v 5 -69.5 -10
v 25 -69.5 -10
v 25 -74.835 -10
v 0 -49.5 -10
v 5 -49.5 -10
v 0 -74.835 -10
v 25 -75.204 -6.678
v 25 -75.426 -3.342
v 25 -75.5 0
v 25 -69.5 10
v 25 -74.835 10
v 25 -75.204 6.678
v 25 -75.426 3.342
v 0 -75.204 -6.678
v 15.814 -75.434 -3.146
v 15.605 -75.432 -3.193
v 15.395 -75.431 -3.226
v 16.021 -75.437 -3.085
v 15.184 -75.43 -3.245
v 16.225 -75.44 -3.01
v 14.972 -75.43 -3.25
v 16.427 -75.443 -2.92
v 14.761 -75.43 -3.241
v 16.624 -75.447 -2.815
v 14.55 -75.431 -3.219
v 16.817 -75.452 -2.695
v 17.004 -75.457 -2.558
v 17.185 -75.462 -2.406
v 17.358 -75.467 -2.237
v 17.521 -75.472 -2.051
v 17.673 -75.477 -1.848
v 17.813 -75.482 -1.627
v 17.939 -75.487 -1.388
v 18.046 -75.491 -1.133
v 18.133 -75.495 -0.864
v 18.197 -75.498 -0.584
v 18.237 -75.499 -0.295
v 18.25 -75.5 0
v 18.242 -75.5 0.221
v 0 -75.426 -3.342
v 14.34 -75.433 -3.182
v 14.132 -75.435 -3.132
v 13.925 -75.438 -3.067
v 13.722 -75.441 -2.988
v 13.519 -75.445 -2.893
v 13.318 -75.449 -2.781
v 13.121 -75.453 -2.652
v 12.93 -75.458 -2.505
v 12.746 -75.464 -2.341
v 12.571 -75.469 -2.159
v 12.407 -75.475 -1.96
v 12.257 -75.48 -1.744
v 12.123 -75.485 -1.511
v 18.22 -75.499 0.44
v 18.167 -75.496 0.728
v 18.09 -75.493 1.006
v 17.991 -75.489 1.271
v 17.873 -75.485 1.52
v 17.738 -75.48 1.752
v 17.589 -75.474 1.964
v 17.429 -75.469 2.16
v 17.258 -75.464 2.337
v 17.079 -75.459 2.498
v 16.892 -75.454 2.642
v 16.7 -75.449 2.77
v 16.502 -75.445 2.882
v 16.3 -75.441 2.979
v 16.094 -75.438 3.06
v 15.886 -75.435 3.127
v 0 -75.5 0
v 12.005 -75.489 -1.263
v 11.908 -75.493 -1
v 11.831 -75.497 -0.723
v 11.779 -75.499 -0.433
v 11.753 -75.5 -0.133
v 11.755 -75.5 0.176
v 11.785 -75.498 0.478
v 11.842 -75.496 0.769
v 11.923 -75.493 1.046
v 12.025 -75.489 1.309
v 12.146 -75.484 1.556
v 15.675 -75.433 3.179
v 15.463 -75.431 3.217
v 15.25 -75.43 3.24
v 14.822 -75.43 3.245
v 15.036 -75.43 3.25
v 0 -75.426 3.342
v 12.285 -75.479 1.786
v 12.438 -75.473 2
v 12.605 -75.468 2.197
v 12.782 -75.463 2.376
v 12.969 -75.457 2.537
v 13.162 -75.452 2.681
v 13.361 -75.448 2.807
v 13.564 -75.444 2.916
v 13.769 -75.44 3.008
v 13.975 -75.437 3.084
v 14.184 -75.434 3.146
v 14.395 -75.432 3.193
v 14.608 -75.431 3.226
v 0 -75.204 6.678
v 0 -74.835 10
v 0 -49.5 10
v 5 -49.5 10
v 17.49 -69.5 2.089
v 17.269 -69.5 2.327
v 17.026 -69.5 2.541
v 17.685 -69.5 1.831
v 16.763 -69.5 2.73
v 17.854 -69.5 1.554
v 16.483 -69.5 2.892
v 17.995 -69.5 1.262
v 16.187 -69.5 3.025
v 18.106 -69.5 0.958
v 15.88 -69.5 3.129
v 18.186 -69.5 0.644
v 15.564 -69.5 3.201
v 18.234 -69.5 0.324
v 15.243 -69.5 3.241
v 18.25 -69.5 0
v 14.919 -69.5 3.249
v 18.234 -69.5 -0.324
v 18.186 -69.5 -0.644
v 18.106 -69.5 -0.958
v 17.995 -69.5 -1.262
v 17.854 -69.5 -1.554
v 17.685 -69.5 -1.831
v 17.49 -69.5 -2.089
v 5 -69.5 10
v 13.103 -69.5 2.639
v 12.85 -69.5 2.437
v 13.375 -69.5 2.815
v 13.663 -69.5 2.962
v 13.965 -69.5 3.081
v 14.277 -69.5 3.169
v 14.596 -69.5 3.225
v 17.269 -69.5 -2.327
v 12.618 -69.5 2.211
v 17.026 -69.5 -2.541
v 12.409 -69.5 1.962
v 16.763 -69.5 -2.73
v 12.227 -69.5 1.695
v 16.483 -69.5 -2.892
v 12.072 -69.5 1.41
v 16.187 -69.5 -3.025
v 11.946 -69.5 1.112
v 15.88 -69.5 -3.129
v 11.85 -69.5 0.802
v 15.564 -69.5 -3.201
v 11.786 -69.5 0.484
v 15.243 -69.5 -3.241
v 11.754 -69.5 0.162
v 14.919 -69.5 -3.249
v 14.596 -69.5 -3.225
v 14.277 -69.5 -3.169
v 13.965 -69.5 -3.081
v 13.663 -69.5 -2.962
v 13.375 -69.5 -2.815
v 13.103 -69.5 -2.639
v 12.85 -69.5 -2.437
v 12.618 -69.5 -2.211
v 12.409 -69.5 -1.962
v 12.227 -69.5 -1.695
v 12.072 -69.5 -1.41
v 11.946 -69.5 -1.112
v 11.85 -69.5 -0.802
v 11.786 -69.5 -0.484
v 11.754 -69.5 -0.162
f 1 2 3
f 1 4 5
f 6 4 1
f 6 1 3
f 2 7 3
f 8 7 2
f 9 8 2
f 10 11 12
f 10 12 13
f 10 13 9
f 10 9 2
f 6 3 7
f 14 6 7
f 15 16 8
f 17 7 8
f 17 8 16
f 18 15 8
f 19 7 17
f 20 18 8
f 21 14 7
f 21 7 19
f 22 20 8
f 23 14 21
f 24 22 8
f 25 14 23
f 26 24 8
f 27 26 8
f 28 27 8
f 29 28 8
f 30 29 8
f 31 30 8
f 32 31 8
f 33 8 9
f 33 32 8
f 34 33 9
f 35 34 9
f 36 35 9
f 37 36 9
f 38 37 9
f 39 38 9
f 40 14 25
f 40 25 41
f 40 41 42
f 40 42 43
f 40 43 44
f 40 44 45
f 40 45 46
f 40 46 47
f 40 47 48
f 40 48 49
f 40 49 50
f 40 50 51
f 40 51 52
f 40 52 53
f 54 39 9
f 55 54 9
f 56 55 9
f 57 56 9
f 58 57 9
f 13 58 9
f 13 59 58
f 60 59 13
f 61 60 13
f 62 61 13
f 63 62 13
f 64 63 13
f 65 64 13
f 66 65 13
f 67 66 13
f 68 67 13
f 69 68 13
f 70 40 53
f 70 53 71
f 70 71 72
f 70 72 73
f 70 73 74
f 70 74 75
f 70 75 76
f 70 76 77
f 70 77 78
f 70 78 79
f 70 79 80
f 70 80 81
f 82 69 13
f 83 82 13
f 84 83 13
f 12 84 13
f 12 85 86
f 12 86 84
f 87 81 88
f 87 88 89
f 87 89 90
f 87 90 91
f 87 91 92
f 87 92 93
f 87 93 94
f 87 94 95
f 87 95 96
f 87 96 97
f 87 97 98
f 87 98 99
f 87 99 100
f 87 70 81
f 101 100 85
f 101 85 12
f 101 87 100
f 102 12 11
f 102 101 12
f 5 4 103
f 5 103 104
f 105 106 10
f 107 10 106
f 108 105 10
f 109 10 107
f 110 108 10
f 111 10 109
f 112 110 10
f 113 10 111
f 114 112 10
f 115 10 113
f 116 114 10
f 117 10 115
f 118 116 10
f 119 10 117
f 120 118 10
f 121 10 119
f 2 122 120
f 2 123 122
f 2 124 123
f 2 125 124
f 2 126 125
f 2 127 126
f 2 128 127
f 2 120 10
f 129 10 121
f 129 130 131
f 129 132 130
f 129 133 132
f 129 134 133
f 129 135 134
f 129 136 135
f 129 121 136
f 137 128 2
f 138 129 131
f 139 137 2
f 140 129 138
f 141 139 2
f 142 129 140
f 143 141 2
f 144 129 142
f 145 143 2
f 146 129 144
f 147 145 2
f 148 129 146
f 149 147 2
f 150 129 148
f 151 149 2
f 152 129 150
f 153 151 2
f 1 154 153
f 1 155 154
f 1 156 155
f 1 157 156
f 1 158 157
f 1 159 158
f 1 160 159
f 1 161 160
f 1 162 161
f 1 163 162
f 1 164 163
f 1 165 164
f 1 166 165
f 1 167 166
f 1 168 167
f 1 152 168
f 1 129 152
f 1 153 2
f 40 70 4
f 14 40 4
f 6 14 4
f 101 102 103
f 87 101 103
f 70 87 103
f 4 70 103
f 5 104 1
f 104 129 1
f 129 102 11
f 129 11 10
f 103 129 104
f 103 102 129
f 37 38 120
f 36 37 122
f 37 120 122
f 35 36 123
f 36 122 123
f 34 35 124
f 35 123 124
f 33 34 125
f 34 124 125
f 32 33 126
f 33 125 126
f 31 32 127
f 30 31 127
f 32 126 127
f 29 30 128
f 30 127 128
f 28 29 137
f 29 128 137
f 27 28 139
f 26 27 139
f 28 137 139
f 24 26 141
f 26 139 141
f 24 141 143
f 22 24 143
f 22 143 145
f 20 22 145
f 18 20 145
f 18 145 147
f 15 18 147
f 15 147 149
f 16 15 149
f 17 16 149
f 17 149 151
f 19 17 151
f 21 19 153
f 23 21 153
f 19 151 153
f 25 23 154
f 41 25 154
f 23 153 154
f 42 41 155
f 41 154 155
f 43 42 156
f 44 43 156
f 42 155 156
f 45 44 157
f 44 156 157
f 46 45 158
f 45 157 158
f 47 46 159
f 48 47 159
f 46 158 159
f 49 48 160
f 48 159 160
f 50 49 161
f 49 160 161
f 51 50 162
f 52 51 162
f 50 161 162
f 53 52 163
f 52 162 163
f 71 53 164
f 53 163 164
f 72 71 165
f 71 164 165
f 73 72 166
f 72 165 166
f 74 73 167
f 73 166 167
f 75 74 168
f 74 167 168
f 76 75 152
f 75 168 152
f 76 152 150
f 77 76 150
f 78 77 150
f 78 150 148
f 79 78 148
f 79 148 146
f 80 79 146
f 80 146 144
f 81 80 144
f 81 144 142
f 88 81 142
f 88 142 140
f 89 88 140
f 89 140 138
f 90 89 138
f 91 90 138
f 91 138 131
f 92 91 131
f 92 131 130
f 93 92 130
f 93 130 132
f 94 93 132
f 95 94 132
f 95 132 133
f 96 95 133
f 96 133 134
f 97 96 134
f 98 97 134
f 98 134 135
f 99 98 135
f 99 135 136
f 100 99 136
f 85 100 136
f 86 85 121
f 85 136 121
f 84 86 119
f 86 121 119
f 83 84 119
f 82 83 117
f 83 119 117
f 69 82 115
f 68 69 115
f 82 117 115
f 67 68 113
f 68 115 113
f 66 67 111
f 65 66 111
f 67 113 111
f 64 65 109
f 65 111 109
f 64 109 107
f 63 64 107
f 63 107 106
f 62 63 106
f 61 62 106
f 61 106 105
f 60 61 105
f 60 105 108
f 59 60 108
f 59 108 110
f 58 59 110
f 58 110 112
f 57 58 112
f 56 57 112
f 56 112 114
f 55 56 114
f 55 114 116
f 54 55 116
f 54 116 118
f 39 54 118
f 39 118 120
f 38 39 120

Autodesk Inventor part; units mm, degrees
ref_plane "YZ Plane" through (0, 0, 0) normal (1, 0, 0) x (0, 1, 0)
ref_plane "XZ Plane" through (0, 0, 0) normal (0, 1, 0) x (-1, 0, 0)
ref_plane "XY Plane" through (0, 0, 0) normal (0, 0, 1) x (1, 0, 0)
sketch "Skizze1" plane through (0, 0, 0) normal (1, 0, 0) x (0, 1, 0)
  circle A0 centre (0, 0) radius 75.5 construction
  arc A1 (-74.8348, 10) -> (-74.8348, -10) centre (0, 0) ccw
  line L0 (-74.8348, 10) -> (-69.5, 10)
  line L1 (-69.5, 10) -> (-69.5, -10)
  line L2 (-69.5, -10) -> (-74.8348, -10)
  point P0 (-75.5, 0)
  dimension "d3" = 151
  dimension "d4" = 6
  dimension "d5" = 20
extrude "Extrusion1" add sketch "Skizze1" along normal blind 25
sketch "Skizze2" plane through (0, -69.5, 10) normal (0, 1, 0) x (1, 0, 0)
  line L0 (0, 0) -> (5, 0)
  line L1 (5, 0) -> (5, 20)
  line L2 (5, 20) -> (0, 20)
  line L3 (0, 20) -> (0, 0)
  line L4 (0, 20) -> (25, 20) projected
  point P0 (0, 10)
  dimension "d8" = 5
extrude "Extrusion2" add sketch "Skizze2" along normal blind 20
sketch "Skizze3" plane through (25, -69.5, 10) normal (0, 1, 0) x (1, 0, 0)
  circle A0 centre (-10, 10) radius 3.25
  line L0 (-20, 20) -> (-20, 0) construction
  line L1 (-20, 0) -> (0, 0) construction
  line L2 (0, 20) -> (0, 0) construction
  line L3 (-20, 20) -> (0, 20) construction
  line L4 (-20, 20) -> (0, 0) construction
  line L5 (0, 20) -> (-20, 0) construction
  point P0 (-25, 10)
  dimension "d11" = 6.5
extrude "Extrusion4" cut sketch "Skizze3" against normal blind 10
properties part number "Slider_Winkel"
